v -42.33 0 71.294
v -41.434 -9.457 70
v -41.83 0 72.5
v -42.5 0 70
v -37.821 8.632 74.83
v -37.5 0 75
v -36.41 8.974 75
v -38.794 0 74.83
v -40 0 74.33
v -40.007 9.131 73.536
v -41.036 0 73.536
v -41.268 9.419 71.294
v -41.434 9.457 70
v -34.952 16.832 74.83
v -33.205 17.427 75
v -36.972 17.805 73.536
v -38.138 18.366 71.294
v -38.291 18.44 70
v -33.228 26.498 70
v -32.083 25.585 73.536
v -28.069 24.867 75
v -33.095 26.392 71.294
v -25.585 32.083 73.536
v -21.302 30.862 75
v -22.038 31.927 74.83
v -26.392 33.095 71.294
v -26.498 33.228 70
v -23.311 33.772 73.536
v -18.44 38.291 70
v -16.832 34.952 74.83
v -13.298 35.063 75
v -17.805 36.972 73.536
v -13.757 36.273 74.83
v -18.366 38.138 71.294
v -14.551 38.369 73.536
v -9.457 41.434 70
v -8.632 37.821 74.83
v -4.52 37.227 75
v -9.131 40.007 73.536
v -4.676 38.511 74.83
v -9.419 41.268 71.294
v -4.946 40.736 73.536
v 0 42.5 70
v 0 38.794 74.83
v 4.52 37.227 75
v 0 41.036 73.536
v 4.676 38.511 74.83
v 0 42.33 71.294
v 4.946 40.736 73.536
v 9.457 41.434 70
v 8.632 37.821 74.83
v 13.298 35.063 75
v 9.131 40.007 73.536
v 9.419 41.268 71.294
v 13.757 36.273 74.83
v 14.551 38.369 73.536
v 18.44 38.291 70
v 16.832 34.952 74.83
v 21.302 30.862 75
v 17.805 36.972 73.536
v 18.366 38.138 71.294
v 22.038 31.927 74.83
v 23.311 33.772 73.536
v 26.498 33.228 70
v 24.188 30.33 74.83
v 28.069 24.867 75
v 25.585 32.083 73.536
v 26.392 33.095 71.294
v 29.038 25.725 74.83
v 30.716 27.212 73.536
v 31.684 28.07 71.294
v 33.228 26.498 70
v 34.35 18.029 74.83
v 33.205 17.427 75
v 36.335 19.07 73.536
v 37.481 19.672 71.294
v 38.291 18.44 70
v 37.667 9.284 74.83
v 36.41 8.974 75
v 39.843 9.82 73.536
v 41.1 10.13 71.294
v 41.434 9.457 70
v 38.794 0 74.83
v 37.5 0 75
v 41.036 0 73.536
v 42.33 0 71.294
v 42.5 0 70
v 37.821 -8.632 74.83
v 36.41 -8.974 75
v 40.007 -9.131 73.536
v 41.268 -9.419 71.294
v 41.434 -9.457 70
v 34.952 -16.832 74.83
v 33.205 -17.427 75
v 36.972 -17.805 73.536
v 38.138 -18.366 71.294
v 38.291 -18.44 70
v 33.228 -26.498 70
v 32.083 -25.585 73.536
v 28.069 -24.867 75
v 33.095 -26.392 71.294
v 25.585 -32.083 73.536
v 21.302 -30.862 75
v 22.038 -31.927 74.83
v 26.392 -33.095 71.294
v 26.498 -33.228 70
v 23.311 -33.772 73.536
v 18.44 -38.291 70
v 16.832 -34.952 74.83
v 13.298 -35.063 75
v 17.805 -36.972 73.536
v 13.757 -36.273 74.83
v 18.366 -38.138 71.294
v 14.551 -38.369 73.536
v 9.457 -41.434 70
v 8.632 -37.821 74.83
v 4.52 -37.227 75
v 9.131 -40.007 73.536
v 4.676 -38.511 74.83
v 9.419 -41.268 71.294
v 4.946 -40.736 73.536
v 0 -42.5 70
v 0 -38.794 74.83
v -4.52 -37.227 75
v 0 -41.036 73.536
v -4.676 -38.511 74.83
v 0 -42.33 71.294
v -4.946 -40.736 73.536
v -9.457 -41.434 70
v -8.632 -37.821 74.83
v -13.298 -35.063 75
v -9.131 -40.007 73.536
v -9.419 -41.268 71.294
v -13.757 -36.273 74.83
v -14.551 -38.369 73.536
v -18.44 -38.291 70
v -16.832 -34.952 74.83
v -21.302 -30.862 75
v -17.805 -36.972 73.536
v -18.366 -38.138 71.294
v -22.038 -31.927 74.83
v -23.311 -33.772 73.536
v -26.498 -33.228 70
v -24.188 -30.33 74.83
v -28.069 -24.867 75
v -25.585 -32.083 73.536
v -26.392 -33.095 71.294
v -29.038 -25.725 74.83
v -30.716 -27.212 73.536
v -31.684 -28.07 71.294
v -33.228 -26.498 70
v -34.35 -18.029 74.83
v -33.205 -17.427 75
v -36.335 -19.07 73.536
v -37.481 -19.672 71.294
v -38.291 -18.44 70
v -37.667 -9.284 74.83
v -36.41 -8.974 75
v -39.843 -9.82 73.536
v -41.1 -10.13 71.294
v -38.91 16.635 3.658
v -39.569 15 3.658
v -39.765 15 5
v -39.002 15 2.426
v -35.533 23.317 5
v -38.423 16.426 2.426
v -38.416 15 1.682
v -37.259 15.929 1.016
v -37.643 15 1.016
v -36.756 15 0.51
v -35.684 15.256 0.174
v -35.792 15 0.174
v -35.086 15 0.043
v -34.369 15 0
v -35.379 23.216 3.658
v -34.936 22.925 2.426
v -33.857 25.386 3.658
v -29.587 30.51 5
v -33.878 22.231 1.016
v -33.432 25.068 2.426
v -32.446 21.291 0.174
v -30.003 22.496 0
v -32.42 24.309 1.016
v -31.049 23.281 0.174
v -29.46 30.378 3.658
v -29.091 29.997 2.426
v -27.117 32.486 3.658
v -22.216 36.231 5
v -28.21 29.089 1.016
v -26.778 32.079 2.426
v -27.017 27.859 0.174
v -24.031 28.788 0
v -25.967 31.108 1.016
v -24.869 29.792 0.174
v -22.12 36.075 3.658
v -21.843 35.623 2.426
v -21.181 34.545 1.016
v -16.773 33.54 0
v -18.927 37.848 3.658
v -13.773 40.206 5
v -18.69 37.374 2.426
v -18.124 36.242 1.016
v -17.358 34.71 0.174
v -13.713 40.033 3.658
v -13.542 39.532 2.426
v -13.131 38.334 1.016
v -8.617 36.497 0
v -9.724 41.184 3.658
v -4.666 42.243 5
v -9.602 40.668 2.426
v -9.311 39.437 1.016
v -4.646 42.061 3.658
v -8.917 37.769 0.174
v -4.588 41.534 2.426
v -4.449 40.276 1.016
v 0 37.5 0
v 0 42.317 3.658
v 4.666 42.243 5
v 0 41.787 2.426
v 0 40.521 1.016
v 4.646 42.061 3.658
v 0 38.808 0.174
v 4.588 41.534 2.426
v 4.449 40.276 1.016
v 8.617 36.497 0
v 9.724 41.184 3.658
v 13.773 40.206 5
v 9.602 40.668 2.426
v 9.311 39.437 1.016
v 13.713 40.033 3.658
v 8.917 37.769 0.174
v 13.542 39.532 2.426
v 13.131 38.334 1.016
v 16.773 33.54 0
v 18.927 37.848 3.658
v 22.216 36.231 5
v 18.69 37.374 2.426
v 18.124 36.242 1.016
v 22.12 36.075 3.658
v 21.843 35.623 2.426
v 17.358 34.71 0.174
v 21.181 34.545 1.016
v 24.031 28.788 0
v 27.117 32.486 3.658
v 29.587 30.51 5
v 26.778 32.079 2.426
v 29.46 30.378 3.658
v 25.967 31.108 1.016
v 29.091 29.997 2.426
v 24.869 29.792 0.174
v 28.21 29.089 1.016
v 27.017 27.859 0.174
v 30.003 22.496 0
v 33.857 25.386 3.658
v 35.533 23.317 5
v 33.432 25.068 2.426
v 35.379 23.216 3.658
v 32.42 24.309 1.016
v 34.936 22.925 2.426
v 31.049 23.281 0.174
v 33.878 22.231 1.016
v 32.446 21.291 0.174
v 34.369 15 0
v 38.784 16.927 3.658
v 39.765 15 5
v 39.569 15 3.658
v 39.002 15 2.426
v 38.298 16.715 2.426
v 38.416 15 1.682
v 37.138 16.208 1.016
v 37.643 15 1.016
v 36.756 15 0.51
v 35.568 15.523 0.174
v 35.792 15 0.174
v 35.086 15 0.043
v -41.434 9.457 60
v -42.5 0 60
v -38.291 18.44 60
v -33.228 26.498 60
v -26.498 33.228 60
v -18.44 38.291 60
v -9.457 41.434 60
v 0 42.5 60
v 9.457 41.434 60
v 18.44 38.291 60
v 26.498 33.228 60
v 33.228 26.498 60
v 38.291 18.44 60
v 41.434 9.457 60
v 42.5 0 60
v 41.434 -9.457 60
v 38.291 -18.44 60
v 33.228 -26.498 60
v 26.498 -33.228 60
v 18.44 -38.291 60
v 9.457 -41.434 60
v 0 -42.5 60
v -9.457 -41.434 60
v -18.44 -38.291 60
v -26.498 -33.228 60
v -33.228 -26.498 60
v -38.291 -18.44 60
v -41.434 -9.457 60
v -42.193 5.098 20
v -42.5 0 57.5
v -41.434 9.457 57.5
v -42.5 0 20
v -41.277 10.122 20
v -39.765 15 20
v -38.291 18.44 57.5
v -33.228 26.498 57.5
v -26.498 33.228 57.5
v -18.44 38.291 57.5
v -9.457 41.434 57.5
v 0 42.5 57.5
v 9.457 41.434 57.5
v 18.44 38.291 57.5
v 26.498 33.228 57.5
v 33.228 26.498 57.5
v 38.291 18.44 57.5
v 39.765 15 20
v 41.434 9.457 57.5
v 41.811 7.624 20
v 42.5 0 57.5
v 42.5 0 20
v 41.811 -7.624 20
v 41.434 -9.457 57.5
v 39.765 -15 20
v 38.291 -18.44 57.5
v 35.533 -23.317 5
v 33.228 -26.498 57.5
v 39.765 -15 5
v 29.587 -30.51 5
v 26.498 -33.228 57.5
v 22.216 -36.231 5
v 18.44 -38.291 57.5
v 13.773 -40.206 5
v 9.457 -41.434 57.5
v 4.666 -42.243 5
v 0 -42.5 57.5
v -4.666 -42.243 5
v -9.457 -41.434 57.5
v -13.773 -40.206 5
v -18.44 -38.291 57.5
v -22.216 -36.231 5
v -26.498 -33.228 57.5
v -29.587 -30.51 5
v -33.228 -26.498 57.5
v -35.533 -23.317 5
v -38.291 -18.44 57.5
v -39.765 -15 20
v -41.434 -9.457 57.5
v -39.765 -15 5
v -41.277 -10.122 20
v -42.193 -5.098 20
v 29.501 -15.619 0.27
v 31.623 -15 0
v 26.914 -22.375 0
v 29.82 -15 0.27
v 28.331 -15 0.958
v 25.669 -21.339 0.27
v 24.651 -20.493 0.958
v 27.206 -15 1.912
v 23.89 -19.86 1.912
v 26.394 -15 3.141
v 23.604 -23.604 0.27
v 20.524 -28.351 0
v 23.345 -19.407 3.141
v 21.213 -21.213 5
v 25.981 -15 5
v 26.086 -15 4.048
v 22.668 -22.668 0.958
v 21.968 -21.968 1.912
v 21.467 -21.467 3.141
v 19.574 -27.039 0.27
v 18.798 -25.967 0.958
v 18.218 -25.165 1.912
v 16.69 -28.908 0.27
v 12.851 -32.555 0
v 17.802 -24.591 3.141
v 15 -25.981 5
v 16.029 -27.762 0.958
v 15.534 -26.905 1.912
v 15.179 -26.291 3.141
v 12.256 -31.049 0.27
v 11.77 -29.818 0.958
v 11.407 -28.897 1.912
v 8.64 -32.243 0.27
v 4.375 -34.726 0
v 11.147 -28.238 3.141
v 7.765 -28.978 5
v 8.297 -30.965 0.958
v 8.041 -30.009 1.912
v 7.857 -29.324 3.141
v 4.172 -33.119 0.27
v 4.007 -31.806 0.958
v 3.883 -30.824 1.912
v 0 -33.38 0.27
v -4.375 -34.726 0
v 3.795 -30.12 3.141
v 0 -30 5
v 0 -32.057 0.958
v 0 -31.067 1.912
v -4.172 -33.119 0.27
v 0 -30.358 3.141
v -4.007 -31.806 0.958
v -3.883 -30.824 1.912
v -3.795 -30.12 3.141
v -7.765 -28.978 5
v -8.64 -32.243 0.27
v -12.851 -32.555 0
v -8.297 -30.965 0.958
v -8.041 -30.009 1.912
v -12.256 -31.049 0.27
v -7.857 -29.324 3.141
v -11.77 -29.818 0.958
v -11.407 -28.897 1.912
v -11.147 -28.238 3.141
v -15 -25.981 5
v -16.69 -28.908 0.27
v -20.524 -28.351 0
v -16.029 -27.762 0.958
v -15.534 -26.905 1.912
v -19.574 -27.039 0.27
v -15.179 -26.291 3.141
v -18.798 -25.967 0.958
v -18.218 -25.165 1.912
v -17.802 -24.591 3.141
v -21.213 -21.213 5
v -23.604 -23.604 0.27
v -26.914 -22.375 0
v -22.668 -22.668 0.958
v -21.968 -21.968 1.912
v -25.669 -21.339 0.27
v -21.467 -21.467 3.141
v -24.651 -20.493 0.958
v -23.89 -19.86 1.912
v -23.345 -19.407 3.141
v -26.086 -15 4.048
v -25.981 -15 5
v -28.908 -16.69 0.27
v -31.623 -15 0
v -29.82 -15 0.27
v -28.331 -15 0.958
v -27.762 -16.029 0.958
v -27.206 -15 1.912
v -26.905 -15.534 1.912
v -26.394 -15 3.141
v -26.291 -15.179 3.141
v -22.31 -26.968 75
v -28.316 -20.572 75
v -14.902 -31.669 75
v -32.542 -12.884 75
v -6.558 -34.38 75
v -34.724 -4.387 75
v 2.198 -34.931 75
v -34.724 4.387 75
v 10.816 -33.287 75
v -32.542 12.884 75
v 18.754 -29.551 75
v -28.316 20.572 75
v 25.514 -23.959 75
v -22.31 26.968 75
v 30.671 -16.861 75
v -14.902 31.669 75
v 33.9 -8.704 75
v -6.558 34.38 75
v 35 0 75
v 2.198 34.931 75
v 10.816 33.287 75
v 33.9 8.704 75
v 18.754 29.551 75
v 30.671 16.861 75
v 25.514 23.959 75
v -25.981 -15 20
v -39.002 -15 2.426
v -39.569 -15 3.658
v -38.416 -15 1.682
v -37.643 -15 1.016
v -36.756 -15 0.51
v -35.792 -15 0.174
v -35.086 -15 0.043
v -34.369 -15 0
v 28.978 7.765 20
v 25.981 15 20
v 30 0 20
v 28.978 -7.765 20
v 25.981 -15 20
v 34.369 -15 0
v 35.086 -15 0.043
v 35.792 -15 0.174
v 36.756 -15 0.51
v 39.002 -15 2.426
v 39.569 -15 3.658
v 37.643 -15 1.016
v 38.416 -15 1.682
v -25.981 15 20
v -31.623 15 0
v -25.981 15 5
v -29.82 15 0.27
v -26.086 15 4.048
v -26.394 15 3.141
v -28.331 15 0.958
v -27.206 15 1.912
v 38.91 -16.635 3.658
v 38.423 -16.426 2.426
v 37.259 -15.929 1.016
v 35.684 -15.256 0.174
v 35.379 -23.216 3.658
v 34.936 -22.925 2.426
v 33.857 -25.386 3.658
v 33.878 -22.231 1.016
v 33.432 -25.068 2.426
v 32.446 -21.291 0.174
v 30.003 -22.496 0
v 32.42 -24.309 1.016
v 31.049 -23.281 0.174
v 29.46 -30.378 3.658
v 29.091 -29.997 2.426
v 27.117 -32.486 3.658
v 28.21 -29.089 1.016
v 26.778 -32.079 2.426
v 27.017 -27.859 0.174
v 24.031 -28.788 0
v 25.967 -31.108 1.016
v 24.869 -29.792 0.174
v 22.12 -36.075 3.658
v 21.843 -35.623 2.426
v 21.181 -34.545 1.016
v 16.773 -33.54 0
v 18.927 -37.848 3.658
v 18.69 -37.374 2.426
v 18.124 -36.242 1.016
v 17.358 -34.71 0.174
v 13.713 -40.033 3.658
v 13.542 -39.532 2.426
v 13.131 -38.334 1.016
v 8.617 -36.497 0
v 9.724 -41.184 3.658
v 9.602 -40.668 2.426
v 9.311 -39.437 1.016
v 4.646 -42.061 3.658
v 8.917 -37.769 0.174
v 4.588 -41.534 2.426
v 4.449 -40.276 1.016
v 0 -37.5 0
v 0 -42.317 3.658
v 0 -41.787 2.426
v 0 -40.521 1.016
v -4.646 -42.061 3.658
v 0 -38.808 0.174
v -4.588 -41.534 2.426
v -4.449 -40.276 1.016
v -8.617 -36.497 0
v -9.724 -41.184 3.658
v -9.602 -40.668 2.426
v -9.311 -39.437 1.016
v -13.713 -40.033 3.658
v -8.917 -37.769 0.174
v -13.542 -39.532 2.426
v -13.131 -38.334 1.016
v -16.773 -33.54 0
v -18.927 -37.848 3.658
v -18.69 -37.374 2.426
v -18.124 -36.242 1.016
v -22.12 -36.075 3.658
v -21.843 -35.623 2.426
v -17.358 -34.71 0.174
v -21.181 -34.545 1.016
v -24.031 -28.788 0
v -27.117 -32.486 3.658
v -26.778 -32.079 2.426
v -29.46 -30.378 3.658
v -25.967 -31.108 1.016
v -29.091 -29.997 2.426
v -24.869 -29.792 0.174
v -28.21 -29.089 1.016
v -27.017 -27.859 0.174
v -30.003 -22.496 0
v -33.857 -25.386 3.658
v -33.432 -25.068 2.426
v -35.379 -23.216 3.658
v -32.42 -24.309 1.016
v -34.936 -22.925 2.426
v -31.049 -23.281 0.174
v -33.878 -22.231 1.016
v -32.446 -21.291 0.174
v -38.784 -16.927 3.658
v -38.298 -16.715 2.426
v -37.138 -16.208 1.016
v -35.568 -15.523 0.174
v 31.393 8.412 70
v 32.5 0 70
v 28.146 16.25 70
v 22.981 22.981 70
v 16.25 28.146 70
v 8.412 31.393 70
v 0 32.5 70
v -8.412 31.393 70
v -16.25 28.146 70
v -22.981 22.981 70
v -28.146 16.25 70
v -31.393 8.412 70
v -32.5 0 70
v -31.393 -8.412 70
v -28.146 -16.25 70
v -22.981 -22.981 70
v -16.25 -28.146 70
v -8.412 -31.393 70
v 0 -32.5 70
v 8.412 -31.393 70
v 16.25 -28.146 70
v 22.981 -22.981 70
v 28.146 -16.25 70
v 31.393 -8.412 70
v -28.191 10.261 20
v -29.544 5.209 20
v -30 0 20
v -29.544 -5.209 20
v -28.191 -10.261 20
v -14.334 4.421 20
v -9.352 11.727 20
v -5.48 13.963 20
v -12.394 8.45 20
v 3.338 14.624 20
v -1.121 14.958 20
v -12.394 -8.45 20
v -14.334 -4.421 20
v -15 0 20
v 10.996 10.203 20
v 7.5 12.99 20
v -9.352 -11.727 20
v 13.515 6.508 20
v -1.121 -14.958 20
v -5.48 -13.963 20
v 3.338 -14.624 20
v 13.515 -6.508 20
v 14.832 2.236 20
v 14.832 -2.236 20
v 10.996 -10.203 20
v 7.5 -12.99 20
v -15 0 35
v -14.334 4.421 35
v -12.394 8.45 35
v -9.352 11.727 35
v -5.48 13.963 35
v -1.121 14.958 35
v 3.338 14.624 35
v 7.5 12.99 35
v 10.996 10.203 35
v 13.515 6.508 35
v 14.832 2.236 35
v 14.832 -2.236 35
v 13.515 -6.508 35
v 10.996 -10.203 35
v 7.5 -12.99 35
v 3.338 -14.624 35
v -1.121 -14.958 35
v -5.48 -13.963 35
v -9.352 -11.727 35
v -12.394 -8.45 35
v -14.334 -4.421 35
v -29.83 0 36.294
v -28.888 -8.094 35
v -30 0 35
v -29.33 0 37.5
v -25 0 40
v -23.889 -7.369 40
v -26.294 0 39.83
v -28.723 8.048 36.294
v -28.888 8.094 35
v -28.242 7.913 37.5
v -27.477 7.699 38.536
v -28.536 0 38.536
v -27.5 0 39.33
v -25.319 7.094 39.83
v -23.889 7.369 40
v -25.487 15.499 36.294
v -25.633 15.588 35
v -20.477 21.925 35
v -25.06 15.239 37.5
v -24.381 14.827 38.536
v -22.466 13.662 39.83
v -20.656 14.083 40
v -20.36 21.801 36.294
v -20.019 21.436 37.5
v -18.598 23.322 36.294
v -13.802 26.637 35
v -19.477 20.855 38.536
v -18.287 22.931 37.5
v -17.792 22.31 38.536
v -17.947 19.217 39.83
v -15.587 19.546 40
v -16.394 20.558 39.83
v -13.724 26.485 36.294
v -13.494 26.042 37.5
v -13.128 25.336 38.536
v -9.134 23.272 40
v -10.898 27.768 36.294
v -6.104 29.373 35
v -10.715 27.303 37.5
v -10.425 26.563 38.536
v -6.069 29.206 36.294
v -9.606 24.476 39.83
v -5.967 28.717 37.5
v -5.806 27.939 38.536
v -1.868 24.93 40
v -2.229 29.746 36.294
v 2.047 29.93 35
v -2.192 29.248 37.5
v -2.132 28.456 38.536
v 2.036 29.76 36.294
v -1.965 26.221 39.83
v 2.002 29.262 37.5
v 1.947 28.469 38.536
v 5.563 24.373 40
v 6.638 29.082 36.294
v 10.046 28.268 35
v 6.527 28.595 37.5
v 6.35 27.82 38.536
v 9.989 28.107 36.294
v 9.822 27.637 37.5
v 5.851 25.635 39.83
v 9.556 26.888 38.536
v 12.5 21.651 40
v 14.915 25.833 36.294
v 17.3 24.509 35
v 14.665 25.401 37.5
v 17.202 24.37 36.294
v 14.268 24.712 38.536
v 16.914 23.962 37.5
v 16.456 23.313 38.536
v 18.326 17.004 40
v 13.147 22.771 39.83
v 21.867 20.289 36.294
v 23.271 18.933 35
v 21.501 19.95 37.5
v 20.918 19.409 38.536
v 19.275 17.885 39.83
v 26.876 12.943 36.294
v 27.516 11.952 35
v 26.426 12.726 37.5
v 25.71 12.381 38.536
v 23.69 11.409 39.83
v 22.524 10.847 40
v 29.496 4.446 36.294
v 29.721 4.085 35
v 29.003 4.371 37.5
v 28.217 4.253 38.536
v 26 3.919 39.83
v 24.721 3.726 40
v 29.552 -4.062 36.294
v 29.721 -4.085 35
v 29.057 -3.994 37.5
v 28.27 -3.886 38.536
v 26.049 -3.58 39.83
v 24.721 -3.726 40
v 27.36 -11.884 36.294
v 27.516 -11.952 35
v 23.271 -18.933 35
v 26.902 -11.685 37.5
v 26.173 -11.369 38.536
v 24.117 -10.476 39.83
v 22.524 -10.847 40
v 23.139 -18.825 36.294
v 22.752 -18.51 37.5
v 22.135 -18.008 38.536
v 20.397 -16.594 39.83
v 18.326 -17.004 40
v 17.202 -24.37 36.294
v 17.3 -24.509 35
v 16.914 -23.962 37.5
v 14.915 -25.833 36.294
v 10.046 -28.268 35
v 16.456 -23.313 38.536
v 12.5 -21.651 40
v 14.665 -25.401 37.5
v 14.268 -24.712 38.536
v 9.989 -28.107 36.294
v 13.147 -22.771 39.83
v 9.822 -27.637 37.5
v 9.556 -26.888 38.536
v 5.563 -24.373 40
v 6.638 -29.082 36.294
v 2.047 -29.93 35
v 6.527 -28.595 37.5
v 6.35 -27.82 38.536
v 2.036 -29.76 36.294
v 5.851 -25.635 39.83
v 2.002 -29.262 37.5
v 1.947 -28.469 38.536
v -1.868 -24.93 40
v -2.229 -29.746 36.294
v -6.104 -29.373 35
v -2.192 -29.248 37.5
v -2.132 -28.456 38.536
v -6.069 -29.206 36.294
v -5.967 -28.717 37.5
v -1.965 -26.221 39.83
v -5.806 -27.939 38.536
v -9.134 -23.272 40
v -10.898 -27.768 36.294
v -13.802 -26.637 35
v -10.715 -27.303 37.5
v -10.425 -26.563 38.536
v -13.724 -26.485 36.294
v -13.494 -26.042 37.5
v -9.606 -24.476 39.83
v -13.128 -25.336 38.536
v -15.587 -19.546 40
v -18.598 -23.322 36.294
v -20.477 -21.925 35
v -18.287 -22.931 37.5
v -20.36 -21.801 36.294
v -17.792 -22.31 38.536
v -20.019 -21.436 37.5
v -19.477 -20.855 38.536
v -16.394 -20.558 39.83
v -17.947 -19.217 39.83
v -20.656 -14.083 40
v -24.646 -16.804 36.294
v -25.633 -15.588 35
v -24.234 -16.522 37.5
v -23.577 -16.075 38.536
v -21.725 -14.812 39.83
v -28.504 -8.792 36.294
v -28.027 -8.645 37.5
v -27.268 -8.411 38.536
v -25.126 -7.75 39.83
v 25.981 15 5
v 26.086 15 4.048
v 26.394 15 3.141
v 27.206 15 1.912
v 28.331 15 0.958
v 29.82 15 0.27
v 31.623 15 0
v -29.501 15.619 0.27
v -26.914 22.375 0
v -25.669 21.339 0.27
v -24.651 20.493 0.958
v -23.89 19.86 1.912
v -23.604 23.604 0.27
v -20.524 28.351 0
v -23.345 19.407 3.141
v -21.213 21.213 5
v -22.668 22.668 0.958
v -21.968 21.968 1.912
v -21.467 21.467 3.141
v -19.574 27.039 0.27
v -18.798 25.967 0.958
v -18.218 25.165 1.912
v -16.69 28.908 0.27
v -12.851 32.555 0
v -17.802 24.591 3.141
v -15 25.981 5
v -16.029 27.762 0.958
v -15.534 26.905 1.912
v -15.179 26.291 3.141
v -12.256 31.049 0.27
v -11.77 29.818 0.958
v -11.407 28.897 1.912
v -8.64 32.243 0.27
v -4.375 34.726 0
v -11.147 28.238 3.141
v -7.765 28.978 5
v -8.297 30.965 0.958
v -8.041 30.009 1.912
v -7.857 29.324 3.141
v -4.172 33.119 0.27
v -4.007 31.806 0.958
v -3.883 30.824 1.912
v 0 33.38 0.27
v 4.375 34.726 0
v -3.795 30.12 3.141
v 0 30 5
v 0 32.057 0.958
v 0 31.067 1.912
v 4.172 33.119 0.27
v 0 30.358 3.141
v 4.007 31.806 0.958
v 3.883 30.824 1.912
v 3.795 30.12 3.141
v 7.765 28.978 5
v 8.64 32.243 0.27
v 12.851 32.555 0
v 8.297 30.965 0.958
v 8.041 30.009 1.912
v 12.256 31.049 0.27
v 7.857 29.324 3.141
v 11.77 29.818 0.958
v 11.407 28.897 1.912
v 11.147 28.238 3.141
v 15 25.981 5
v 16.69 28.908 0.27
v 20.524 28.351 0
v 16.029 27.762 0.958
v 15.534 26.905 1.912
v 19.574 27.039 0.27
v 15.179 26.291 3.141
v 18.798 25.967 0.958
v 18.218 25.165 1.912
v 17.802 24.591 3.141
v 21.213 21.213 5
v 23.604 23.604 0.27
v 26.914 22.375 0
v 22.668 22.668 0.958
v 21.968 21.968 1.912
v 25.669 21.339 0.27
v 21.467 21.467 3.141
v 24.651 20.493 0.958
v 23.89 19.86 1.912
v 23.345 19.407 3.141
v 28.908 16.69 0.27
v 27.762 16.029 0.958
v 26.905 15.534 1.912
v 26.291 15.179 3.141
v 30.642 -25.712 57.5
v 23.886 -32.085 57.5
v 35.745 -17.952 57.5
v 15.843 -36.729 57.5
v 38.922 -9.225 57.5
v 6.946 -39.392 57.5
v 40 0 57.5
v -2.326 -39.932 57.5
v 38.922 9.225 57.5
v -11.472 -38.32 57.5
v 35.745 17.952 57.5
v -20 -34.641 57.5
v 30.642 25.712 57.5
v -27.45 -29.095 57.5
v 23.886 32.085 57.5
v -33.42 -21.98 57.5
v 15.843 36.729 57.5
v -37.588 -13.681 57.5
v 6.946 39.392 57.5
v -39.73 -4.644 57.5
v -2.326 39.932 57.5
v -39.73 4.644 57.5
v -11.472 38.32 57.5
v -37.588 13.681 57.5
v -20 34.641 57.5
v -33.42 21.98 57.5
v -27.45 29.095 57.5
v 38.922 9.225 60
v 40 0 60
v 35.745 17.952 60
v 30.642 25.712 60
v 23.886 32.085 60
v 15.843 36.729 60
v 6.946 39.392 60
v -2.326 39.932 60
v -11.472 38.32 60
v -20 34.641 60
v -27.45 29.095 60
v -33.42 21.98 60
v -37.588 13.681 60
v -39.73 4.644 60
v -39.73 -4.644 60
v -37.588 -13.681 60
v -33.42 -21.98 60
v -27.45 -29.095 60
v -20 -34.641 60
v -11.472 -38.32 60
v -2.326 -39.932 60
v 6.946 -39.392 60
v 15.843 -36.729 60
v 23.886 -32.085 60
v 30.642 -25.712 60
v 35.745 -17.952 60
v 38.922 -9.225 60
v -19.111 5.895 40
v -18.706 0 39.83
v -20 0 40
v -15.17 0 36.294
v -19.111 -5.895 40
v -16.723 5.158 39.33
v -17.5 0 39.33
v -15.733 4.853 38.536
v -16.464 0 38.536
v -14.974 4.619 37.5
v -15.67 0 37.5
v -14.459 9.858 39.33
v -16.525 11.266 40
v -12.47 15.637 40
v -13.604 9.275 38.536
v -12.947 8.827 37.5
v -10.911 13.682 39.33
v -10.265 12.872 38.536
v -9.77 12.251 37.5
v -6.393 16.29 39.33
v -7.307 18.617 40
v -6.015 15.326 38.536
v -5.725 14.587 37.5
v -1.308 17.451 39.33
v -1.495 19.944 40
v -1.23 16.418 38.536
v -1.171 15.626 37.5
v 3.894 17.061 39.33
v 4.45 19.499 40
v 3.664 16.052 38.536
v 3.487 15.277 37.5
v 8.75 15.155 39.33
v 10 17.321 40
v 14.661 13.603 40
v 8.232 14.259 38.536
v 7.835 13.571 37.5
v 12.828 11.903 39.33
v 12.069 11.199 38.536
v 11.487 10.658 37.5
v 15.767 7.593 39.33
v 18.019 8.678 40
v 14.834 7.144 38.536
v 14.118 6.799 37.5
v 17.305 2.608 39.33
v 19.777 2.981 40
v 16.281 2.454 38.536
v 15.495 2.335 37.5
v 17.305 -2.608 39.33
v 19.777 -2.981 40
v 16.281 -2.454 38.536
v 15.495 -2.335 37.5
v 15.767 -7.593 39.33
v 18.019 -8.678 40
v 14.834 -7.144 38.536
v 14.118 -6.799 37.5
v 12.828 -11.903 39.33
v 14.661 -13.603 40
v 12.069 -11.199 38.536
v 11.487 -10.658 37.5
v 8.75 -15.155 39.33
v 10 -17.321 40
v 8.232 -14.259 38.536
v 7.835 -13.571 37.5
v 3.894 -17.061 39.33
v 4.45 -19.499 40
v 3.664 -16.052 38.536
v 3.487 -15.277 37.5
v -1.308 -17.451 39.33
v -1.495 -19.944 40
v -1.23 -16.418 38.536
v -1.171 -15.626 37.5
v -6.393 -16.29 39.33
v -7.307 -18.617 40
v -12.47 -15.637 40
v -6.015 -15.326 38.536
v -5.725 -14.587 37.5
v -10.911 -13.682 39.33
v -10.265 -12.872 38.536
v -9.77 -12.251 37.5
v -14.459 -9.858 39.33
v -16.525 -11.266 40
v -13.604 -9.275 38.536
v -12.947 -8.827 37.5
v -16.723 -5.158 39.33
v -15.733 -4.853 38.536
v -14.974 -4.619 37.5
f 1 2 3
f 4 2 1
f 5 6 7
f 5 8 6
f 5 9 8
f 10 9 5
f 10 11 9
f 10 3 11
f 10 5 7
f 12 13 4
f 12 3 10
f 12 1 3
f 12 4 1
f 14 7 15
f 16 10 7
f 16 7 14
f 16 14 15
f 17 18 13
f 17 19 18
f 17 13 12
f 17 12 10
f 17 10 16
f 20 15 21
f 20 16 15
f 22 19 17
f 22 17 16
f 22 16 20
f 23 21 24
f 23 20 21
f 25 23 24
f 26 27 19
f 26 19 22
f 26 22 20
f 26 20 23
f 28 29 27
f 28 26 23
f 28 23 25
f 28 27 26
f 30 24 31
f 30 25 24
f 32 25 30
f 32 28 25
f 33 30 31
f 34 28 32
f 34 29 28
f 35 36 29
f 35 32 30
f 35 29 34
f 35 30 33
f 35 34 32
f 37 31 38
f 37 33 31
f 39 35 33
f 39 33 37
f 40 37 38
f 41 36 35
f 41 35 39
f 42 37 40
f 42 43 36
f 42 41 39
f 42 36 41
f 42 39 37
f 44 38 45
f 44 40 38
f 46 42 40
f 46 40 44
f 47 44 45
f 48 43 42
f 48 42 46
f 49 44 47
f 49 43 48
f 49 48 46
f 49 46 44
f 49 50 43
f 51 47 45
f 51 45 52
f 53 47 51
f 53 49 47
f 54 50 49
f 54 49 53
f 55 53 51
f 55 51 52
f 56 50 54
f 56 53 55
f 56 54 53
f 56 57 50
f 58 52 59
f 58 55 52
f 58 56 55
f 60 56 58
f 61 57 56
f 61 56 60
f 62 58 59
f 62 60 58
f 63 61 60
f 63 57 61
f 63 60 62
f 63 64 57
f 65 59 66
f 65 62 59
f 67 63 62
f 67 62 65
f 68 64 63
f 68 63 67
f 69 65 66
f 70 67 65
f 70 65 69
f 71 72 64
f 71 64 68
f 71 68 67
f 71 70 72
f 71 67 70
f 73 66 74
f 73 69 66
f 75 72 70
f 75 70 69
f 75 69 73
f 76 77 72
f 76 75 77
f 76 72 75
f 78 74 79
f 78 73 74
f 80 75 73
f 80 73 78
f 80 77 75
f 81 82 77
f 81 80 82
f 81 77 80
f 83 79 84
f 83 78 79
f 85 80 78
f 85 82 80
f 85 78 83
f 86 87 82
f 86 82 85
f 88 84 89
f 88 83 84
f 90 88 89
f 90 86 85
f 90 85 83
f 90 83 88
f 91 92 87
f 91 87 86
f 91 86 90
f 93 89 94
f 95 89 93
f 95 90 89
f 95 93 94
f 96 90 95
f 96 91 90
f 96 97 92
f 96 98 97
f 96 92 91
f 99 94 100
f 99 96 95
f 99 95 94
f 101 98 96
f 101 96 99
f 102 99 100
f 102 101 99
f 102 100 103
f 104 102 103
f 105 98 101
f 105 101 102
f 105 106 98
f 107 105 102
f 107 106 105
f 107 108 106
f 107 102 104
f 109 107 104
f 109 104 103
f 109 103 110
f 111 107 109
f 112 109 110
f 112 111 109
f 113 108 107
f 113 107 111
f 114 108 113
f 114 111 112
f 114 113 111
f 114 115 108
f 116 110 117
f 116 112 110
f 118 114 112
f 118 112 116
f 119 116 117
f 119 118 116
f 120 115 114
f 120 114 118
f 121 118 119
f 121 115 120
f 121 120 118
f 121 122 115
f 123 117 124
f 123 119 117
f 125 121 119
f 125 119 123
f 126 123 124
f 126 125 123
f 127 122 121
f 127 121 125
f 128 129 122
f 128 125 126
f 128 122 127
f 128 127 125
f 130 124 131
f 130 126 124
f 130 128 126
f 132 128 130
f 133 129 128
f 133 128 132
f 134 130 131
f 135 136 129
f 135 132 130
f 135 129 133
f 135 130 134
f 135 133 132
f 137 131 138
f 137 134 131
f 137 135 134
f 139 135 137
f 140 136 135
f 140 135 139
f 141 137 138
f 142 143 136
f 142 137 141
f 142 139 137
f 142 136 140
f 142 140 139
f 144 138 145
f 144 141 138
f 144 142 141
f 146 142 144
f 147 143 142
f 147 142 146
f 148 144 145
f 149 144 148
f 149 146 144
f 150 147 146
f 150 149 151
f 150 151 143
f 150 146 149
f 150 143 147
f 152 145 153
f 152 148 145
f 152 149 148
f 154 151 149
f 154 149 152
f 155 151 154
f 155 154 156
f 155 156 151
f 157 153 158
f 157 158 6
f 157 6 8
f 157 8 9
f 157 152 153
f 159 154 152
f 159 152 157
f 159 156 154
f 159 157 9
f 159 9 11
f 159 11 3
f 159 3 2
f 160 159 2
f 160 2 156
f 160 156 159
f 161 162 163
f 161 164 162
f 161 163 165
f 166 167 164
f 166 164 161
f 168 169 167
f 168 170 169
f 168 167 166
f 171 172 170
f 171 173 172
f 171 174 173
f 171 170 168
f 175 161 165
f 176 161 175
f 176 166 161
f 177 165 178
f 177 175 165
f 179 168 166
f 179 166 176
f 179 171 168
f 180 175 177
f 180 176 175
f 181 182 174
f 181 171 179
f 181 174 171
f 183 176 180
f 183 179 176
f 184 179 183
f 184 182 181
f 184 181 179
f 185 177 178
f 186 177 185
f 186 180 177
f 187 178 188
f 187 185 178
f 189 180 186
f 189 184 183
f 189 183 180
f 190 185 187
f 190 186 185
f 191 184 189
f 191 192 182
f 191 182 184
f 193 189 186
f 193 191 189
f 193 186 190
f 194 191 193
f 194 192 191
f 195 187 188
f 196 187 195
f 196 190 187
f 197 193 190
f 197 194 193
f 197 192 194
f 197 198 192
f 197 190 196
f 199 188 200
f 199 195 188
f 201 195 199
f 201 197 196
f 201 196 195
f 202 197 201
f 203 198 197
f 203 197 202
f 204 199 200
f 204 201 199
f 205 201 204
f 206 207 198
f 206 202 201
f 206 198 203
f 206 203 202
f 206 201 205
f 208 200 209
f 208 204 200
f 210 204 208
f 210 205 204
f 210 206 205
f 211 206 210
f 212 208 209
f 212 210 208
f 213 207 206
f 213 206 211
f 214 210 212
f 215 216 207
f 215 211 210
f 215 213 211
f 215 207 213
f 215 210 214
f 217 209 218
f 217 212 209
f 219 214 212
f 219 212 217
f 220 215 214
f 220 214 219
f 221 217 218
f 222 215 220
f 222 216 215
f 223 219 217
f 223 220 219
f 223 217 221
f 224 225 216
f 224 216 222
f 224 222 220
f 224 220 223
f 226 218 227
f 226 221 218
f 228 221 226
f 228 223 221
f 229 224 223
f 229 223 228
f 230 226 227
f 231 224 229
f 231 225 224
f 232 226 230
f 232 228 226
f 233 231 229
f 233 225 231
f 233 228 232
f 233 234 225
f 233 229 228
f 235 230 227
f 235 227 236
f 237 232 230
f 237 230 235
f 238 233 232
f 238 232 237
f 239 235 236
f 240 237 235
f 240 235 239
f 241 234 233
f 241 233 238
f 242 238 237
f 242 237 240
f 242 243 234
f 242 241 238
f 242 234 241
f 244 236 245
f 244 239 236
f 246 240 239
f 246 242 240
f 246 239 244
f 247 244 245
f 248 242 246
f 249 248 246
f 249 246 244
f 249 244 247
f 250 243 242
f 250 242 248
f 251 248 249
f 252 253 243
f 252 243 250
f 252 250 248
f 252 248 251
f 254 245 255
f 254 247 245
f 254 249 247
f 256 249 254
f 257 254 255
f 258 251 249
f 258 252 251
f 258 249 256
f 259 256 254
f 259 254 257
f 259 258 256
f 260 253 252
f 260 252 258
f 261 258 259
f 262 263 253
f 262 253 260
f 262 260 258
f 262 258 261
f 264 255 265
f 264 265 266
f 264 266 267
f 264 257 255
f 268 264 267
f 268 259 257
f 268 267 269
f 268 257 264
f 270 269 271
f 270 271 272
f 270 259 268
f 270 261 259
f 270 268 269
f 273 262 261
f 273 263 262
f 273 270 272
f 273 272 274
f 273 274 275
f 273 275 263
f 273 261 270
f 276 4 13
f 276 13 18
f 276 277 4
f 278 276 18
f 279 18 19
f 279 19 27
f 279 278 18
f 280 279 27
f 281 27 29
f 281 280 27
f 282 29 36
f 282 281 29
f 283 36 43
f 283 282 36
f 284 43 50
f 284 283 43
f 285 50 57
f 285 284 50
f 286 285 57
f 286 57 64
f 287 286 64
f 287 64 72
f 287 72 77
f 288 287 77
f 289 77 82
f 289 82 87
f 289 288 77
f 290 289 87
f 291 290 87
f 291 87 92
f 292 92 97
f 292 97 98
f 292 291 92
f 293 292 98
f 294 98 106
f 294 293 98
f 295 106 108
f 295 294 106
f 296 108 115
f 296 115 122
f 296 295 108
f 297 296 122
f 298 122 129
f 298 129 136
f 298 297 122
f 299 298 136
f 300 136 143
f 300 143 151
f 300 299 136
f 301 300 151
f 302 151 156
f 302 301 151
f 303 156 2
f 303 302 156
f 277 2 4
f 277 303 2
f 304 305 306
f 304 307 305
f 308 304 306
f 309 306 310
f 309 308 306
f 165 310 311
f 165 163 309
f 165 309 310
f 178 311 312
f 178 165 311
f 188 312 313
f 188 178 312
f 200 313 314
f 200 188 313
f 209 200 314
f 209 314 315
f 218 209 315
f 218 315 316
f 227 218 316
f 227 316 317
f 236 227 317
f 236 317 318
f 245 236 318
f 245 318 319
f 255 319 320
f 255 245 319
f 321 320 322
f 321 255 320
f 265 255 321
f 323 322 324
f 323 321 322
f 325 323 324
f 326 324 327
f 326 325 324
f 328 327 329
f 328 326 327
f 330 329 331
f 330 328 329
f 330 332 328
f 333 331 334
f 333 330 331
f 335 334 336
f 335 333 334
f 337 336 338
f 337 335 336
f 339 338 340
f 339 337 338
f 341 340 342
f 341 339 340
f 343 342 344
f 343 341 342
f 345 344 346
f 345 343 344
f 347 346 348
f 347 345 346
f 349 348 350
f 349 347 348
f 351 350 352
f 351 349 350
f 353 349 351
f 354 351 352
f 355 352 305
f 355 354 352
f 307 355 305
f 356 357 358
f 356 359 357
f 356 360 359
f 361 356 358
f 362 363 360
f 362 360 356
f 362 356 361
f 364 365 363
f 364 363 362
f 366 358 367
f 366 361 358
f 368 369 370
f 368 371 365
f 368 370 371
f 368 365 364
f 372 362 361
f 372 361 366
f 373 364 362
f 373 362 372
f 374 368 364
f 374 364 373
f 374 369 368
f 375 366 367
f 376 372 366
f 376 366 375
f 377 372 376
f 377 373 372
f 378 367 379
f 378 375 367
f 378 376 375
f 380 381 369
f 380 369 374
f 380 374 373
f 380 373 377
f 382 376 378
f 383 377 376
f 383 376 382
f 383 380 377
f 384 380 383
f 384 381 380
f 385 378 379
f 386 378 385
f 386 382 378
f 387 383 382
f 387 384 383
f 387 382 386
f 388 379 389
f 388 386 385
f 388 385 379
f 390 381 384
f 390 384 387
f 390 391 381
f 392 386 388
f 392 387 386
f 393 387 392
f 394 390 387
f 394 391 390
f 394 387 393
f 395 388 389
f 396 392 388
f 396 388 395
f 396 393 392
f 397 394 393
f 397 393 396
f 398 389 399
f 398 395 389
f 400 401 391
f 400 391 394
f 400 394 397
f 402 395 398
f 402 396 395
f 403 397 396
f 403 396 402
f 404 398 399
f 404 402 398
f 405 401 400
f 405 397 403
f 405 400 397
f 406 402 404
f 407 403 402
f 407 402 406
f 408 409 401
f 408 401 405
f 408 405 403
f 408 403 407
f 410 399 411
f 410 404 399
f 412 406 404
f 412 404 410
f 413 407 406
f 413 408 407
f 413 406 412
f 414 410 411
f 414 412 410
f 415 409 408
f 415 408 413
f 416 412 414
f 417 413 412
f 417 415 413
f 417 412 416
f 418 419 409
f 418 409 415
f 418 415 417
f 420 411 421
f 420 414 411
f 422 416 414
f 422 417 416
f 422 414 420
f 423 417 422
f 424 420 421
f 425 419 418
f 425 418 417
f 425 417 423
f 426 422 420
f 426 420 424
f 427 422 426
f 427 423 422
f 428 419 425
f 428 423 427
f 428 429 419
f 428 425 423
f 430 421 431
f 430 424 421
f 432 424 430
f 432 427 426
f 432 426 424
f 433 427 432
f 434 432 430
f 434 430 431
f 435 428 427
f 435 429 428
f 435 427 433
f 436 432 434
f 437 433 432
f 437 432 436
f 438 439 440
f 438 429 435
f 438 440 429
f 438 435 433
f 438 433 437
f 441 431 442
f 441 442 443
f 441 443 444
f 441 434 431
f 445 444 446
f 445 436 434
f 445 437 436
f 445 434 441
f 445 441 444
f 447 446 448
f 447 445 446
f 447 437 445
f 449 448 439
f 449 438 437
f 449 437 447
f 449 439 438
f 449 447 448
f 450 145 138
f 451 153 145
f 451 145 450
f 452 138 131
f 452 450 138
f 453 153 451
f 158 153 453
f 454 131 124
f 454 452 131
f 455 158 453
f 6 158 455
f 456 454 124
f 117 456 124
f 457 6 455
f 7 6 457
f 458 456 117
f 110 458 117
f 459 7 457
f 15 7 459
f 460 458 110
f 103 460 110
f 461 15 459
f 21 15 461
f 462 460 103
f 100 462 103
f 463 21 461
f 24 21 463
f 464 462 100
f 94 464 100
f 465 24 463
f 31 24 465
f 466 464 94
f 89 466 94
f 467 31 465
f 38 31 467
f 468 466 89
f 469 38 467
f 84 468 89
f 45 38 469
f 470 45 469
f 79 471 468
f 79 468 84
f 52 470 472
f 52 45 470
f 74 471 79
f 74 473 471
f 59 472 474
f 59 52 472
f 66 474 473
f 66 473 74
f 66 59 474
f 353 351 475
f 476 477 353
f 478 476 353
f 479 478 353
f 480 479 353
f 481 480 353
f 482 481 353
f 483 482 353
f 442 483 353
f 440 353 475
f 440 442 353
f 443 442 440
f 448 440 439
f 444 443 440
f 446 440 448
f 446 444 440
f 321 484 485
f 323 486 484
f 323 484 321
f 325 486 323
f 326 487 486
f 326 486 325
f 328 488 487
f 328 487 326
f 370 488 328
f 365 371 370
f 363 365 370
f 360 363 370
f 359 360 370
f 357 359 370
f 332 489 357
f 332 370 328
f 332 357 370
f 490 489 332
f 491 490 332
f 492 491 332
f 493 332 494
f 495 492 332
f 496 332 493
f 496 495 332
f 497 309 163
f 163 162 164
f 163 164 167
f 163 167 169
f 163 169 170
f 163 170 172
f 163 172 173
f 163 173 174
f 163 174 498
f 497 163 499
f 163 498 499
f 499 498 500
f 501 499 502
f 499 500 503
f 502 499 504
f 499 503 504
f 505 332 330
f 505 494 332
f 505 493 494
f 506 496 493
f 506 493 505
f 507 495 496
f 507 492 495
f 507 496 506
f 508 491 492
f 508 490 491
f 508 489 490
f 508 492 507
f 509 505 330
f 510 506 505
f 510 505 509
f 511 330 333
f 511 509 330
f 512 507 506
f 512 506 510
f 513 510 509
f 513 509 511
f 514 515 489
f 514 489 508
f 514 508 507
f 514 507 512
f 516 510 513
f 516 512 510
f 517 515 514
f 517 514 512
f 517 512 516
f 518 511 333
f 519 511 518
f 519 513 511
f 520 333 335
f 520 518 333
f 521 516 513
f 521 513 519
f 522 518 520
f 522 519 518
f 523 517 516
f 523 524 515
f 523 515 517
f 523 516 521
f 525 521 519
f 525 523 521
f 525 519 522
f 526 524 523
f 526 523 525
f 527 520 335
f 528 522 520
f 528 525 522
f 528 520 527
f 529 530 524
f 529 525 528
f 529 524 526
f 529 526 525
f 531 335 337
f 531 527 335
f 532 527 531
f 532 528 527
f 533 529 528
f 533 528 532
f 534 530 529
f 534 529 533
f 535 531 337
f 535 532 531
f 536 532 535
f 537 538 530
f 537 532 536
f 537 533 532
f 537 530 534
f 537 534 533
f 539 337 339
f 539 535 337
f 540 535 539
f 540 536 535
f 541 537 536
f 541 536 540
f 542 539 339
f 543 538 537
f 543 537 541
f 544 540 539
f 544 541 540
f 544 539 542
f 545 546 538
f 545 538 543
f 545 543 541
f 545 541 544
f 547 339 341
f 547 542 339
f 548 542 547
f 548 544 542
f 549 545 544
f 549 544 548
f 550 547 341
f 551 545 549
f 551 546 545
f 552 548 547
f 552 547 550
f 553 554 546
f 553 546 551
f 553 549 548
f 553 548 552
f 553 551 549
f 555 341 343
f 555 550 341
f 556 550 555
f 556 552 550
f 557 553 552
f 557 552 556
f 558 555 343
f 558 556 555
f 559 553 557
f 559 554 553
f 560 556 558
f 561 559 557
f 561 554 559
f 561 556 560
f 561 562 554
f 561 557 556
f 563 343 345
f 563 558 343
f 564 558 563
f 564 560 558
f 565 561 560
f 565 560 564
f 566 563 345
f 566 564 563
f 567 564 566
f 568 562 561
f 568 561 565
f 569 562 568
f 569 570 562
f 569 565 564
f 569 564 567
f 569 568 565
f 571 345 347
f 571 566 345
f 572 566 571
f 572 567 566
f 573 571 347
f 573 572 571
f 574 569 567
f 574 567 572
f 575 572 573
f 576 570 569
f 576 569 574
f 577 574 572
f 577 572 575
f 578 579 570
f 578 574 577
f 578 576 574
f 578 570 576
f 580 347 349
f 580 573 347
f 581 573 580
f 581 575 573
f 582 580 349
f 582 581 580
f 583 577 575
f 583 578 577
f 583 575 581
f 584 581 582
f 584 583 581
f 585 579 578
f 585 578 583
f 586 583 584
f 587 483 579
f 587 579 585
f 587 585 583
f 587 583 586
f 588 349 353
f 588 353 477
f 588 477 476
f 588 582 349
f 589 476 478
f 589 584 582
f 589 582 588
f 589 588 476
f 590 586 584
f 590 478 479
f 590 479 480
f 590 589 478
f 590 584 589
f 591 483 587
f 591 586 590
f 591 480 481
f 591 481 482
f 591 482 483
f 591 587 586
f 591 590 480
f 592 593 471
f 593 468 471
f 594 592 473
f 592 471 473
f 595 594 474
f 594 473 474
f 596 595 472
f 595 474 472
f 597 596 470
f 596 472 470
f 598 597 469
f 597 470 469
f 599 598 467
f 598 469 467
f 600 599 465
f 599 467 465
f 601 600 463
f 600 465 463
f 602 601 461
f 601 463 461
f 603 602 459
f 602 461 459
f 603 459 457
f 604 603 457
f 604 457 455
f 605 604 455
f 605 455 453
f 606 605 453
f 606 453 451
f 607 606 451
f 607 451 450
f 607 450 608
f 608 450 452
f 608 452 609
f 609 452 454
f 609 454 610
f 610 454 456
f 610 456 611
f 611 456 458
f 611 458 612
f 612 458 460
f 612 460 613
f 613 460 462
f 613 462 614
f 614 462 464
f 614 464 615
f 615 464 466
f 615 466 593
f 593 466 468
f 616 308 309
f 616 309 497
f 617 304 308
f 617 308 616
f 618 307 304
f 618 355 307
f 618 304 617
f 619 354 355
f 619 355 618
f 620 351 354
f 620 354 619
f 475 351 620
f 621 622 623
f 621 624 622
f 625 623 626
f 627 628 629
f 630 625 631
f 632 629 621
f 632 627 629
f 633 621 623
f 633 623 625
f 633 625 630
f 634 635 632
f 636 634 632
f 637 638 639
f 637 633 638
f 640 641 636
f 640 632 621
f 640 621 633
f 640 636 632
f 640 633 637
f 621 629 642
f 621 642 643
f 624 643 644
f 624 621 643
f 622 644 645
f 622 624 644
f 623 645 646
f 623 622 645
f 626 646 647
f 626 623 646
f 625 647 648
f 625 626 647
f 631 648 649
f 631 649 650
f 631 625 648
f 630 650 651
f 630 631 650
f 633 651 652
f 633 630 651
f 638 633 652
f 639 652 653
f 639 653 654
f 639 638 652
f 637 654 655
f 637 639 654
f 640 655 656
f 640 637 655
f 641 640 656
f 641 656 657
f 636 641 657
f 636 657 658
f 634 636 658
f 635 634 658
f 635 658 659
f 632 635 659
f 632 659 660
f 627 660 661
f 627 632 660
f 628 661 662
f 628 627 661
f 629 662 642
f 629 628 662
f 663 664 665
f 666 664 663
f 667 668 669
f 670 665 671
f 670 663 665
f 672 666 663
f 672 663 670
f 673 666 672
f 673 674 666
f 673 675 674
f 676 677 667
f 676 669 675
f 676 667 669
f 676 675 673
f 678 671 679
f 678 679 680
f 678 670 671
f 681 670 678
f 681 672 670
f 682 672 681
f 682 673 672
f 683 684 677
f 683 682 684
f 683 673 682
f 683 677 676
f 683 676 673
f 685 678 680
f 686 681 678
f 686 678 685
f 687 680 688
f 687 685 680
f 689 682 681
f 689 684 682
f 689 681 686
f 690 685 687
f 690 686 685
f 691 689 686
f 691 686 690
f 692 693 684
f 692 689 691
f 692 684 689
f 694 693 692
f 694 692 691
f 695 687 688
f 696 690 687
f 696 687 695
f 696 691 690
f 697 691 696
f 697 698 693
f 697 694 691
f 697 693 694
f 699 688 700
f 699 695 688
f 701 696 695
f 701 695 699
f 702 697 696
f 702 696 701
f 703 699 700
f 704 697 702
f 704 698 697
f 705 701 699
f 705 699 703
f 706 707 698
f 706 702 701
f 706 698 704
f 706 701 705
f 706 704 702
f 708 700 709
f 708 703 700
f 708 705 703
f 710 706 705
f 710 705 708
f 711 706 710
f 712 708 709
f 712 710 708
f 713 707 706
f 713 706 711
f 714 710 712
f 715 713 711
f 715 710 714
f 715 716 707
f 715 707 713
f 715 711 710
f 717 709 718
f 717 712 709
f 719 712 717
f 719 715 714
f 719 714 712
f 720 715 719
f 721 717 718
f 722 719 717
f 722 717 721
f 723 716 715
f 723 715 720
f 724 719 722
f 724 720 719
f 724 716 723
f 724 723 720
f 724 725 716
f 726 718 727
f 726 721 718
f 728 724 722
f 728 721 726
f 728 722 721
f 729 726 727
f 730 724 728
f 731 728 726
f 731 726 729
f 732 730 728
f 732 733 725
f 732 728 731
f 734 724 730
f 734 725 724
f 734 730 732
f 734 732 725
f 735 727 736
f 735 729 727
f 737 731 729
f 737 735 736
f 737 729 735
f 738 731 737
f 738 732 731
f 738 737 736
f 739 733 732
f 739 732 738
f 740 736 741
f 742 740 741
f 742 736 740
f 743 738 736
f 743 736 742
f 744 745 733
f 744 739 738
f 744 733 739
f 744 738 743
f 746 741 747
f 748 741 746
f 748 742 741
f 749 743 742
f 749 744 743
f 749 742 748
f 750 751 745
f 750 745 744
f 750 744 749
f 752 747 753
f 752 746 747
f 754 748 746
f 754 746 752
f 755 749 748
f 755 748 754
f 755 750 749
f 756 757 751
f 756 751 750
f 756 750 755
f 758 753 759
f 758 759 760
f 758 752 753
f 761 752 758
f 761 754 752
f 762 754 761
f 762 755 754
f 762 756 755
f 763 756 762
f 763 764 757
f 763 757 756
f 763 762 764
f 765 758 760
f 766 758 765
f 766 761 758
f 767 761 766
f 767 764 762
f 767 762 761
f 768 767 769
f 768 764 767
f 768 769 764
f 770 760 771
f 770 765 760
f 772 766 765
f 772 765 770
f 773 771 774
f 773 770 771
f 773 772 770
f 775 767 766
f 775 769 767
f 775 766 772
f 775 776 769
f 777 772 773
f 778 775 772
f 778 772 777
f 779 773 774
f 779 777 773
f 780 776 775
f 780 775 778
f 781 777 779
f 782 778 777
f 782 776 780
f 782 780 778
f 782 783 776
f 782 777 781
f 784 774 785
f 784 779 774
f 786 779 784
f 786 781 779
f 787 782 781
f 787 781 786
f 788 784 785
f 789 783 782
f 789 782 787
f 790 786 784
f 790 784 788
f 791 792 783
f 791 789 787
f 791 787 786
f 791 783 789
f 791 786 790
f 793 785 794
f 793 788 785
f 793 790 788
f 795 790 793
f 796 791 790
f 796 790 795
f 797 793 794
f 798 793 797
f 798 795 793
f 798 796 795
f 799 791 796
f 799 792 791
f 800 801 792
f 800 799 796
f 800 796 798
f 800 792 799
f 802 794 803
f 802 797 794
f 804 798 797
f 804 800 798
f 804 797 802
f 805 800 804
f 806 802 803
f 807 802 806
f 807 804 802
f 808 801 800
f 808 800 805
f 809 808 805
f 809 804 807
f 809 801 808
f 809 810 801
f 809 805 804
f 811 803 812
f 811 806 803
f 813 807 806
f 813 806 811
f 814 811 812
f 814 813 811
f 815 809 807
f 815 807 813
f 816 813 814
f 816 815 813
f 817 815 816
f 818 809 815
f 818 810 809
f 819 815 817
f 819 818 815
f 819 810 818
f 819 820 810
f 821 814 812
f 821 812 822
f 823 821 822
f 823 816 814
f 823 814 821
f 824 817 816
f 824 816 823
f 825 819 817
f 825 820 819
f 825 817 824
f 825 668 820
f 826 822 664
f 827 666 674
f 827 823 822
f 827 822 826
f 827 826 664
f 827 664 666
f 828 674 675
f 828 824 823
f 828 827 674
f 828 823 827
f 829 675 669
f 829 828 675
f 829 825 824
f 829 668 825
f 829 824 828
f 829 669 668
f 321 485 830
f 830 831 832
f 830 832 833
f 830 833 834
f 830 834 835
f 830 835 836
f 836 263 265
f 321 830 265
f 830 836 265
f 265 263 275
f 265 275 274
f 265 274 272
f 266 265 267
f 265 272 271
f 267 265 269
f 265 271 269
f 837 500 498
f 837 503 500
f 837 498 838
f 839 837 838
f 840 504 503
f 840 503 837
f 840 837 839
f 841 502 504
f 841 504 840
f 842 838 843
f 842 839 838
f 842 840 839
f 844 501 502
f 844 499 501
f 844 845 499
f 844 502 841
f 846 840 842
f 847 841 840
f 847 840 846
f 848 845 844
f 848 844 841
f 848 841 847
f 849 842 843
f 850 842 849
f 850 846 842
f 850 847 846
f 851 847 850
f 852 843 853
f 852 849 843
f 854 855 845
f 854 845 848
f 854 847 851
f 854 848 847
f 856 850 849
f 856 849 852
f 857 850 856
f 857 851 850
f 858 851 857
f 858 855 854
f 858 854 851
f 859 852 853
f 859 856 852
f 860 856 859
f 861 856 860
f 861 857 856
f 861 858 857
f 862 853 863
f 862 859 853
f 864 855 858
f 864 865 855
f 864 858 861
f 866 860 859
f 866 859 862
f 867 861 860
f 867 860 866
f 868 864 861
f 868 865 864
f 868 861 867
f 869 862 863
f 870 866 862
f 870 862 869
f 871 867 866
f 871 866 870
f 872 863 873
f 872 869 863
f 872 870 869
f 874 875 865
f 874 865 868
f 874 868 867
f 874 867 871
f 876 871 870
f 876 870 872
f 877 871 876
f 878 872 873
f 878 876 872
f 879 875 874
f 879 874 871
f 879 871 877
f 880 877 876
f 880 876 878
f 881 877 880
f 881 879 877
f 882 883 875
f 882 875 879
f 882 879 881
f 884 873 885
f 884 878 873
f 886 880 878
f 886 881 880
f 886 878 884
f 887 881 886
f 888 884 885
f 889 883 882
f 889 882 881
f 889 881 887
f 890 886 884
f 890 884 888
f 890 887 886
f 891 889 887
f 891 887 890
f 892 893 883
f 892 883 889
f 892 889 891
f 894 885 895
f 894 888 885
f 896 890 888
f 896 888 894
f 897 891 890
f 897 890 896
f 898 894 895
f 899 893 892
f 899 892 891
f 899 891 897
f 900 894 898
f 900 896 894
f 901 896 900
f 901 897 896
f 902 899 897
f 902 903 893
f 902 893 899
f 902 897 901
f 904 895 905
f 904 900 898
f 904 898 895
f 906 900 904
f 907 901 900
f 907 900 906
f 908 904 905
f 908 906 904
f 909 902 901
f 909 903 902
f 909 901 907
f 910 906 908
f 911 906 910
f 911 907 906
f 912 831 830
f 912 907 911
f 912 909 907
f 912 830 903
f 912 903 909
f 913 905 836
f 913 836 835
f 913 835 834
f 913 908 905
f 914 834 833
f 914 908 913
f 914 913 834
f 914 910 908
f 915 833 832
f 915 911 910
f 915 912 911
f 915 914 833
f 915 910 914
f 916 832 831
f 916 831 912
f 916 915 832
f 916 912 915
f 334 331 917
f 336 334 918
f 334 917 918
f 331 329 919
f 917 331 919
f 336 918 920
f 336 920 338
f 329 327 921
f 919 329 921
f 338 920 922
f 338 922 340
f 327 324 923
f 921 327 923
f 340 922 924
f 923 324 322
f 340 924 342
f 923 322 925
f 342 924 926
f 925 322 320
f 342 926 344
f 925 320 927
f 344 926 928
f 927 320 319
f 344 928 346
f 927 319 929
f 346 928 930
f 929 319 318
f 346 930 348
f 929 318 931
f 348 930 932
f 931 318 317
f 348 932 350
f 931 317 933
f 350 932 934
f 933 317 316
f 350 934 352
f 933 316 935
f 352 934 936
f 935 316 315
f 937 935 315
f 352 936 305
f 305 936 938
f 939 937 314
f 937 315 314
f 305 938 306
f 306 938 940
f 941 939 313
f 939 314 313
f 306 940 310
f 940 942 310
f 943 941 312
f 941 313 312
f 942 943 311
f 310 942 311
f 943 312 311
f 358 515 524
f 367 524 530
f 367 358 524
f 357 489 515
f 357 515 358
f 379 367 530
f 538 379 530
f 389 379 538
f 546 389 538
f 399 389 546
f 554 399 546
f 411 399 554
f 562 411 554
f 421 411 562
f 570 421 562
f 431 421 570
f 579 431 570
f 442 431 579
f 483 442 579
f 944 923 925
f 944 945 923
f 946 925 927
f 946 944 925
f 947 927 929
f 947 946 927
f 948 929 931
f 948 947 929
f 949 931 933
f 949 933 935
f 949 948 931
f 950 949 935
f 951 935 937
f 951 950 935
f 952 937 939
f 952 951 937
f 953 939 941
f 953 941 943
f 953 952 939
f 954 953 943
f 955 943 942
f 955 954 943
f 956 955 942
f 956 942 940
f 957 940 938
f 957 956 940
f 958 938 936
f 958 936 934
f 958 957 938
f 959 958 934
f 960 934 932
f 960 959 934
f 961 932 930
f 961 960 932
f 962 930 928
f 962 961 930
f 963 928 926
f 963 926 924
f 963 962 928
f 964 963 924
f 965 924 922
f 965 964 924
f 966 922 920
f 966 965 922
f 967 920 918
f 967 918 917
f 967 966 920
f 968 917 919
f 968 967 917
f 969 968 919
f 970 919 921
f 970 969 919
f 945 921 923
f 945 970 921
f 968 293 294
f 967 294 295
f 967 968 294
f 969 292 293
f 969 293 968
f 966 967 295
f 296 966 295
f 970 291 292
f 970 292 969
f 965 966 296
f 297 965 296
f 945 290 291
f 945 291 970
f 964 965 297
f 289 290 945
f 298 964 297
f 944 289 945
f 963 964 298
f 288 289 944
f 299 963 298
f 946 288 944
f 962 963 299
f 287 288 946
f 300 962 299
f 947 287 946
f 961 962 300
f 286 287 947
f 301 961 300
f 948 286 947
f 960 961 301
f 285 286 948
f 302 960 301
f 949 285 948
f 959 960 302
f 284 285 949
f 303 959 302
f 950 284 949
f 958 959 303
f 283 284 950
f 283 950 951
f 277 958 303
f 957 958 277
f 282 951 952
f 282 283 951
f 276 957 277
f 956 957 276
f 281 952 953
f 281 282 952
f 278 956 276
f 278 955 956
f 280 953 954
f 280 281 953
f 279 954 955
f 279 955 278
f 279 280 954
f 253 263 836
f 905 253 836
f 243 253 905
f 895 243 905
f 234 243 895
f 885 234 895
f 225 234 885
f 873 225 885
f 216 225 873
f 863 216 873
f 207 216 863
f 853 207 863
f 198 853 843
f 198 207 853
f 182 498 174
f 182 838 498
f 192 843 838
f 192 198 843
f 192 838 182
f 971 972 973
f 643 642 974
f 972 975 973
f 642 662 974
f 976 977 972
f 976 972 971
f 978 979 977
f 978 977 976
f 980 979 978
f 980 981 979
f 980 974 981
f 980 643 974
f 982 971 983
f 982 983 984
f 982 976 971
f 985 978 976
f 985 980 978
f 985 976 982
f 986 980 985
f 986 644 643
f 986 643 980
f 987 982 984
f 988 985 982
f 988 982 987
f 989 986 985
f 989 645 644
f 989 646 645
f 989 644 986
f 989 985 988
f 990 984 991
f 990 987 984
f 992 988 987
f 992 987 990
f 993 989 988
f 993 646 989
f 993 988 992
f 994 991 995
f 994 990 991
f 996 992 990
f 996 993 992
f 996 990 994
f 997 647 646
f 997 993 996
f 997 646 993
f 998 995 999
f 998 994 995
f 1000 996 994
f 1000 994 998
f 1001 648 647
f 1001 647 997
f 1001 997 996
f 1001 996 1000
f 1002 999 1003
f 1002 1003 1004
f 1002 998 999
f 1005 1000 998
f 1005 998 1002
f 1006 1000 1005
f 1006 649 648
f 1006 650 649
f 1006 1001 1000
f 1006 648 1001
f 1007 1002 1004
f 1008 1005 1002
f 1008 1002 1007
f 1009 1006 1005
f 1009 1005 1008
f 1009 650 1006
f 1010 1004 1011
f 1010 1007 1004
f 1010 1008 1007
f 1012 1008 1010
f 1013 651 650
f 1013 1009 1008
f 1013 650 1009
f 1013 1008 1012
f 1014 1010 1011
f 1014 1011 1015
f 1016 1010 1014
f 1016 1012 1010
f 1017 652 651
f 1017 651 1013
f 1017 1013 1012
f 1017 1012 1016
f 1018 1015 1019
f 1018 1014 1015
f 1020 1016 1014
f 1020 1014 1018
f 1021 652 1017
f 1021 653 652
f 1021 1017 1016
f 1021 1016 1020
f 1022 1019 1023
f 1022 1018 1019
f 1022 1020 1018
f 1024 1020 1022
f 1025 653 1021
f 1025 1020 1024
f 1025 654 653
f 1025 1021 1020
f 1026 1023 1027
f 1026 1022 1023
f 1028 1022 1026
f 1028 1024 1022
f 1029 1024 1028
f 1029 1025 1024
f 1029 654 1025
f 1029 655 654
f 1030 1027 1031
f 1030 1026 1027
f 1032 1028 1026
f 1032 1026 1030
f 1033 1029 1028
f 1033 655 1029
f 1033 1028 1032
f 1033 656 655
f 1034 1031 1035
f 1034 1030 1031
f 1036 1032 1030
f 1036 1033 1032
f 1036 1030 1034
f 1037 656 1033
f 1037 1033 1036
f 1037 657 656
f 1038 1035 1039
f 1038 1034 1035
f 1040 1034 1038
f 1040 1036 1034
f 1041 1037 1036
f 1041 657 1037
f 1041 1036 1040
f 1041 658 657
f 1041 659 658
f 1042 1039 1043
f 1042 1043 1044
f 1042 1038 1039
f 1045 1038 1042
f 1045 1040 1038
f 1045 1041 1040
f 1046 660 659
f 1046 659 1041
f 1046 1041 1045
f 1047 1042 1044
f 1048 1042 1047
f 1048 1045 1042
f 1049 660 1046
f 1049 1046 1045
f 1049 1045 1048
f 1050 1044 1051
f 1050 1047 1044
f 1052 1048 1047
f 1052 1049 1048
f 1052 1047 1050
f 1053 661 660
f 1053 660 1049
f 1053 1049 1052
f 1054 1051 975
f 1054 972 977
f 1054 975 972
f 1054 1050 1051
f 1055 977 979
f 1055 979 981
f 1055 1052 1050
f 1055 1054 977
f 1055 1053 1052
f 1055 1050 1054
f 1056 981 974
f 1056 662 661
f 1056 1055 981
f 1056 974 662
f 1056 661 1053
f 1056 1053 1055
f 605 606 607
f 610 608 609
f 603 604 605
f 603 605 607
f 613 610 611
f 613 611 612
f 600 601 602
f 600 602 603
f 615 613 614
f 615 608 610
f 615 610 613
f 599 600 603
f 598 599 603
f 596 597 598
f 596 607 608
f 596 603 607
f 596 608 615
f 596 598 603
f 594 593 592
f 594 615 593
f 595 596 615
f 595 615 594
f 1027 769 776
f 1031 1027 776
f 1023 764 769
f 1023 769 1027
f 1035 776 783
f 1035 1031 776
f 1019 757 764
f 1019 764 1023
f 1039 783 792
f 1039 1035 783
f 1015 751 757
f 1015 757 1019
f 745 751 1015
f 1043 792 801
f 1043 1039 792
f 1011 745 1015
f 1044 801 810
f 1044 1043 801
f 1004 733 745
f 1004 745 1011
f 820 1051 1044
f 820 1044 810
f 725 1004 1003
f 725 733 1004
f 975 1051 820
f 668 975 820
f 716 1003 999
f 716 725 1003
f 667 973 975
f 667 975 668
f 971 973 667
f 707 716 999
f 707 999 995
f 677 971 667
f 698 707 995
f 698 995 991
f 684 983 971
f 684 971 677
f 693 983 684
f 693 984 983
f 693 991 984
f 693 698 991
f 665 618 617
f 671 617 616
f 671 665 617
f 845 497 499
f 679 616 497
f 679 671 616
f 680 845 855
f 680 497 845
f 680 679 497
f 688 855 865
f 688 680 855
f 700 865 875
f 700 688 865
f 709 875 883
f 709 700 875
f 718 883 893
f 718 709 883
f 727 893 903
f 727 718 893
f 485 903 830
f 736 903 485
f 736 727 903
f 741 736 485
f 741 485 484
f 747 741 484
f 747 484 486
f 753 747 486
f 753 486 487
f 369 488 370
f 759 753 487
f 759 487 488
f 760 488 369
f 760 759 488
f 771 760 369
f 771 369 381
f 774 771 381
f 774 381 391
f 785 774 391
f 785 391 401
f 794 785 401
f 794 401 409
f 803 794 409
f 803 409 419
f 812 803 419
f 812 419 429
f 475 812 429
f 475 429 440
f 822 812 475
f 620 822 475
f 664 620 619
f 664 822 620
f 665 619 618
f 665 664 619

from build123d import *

# Parameters (mm, degrees)
F2_W     = 200
F2_H     = 30
F3_DEPTH = 20
F6_R     = 32.5
F4_R     = 35
F9_W     = 2.5
F9_H     = 2.5


with BuildPart() as f1:
    # F0 (on Front) → F1 (revolve)
    with BuildSketch(Plane.XZ):
        with BuildLine():
            Line((-42.5, 70), (-42.5, 5))
            ThreePointArc((-42.5, 5), (-41.035534, 1.464466), (-37.5, 0))
            Line((-37.5, 0), (-35, 0))
            ThreePointArc((-35, 0), (-31.464466, 1.464466), (-30, 5))
            Line((-30, 5), (-30, 35))
            ThreePointArc((-30, 35), (-28.535534, 38.535534), (-25, 40))
            Line((-25, 40), (-20, 40))
            ThreePointArc((-20, 40), (-16.464466, 38.535534), (-15, 35))
            Line((-15, 35), (-15, 5))
            ThreePointArc((-15, 5), (-13.535534, 1.464466), (-10, 0))
            Line((-10, 0), (0, 0))
            Line((0, 0), (0, 75))
            Line((0, 75), (-37.5, 75))
            ThreePointArc((-37.5, 75), (-41.035534, 73.535534), (-42.5, 70))
        make_face()
    revolve(axis=Axis((0, 0, 37.5), (0, 0, -1)))

    # F2 (on face) → F3 (cut)
    with BuildSketch(Plane(origin=(0, 0, 0), x_dir=(1, 0, 0), z_dir=(0, 0, -1))):
        Rectangle(F2_W, F2_H)
    extrude(amount=-F3_DEPTH, mode=Mode.SUBTRACT)

    # F6 (on offset) → F7 section 0
    with BuildSketch(Plane.XY.offset(70)):
        Circle(F6_R)
    # F4 (on face) → F7 section 1
    with BuildSketch(Plane.XY.offset(75)):
        Circle(F4_R)
    loft(mode=Mode.SUBTRACT)

    # F9 (on Front) → F10 (revolve, cut)
    with BuildSketch(Plane.XZ):
        with Locations((41.25, 58.75)):
            Rectangle(F9_W, F9_H)
    revolve(axis=Axis((0, 0, 44.033579), (0, 0, 1)), mode=Mode.SUBTRACT)


solid = f1.part
